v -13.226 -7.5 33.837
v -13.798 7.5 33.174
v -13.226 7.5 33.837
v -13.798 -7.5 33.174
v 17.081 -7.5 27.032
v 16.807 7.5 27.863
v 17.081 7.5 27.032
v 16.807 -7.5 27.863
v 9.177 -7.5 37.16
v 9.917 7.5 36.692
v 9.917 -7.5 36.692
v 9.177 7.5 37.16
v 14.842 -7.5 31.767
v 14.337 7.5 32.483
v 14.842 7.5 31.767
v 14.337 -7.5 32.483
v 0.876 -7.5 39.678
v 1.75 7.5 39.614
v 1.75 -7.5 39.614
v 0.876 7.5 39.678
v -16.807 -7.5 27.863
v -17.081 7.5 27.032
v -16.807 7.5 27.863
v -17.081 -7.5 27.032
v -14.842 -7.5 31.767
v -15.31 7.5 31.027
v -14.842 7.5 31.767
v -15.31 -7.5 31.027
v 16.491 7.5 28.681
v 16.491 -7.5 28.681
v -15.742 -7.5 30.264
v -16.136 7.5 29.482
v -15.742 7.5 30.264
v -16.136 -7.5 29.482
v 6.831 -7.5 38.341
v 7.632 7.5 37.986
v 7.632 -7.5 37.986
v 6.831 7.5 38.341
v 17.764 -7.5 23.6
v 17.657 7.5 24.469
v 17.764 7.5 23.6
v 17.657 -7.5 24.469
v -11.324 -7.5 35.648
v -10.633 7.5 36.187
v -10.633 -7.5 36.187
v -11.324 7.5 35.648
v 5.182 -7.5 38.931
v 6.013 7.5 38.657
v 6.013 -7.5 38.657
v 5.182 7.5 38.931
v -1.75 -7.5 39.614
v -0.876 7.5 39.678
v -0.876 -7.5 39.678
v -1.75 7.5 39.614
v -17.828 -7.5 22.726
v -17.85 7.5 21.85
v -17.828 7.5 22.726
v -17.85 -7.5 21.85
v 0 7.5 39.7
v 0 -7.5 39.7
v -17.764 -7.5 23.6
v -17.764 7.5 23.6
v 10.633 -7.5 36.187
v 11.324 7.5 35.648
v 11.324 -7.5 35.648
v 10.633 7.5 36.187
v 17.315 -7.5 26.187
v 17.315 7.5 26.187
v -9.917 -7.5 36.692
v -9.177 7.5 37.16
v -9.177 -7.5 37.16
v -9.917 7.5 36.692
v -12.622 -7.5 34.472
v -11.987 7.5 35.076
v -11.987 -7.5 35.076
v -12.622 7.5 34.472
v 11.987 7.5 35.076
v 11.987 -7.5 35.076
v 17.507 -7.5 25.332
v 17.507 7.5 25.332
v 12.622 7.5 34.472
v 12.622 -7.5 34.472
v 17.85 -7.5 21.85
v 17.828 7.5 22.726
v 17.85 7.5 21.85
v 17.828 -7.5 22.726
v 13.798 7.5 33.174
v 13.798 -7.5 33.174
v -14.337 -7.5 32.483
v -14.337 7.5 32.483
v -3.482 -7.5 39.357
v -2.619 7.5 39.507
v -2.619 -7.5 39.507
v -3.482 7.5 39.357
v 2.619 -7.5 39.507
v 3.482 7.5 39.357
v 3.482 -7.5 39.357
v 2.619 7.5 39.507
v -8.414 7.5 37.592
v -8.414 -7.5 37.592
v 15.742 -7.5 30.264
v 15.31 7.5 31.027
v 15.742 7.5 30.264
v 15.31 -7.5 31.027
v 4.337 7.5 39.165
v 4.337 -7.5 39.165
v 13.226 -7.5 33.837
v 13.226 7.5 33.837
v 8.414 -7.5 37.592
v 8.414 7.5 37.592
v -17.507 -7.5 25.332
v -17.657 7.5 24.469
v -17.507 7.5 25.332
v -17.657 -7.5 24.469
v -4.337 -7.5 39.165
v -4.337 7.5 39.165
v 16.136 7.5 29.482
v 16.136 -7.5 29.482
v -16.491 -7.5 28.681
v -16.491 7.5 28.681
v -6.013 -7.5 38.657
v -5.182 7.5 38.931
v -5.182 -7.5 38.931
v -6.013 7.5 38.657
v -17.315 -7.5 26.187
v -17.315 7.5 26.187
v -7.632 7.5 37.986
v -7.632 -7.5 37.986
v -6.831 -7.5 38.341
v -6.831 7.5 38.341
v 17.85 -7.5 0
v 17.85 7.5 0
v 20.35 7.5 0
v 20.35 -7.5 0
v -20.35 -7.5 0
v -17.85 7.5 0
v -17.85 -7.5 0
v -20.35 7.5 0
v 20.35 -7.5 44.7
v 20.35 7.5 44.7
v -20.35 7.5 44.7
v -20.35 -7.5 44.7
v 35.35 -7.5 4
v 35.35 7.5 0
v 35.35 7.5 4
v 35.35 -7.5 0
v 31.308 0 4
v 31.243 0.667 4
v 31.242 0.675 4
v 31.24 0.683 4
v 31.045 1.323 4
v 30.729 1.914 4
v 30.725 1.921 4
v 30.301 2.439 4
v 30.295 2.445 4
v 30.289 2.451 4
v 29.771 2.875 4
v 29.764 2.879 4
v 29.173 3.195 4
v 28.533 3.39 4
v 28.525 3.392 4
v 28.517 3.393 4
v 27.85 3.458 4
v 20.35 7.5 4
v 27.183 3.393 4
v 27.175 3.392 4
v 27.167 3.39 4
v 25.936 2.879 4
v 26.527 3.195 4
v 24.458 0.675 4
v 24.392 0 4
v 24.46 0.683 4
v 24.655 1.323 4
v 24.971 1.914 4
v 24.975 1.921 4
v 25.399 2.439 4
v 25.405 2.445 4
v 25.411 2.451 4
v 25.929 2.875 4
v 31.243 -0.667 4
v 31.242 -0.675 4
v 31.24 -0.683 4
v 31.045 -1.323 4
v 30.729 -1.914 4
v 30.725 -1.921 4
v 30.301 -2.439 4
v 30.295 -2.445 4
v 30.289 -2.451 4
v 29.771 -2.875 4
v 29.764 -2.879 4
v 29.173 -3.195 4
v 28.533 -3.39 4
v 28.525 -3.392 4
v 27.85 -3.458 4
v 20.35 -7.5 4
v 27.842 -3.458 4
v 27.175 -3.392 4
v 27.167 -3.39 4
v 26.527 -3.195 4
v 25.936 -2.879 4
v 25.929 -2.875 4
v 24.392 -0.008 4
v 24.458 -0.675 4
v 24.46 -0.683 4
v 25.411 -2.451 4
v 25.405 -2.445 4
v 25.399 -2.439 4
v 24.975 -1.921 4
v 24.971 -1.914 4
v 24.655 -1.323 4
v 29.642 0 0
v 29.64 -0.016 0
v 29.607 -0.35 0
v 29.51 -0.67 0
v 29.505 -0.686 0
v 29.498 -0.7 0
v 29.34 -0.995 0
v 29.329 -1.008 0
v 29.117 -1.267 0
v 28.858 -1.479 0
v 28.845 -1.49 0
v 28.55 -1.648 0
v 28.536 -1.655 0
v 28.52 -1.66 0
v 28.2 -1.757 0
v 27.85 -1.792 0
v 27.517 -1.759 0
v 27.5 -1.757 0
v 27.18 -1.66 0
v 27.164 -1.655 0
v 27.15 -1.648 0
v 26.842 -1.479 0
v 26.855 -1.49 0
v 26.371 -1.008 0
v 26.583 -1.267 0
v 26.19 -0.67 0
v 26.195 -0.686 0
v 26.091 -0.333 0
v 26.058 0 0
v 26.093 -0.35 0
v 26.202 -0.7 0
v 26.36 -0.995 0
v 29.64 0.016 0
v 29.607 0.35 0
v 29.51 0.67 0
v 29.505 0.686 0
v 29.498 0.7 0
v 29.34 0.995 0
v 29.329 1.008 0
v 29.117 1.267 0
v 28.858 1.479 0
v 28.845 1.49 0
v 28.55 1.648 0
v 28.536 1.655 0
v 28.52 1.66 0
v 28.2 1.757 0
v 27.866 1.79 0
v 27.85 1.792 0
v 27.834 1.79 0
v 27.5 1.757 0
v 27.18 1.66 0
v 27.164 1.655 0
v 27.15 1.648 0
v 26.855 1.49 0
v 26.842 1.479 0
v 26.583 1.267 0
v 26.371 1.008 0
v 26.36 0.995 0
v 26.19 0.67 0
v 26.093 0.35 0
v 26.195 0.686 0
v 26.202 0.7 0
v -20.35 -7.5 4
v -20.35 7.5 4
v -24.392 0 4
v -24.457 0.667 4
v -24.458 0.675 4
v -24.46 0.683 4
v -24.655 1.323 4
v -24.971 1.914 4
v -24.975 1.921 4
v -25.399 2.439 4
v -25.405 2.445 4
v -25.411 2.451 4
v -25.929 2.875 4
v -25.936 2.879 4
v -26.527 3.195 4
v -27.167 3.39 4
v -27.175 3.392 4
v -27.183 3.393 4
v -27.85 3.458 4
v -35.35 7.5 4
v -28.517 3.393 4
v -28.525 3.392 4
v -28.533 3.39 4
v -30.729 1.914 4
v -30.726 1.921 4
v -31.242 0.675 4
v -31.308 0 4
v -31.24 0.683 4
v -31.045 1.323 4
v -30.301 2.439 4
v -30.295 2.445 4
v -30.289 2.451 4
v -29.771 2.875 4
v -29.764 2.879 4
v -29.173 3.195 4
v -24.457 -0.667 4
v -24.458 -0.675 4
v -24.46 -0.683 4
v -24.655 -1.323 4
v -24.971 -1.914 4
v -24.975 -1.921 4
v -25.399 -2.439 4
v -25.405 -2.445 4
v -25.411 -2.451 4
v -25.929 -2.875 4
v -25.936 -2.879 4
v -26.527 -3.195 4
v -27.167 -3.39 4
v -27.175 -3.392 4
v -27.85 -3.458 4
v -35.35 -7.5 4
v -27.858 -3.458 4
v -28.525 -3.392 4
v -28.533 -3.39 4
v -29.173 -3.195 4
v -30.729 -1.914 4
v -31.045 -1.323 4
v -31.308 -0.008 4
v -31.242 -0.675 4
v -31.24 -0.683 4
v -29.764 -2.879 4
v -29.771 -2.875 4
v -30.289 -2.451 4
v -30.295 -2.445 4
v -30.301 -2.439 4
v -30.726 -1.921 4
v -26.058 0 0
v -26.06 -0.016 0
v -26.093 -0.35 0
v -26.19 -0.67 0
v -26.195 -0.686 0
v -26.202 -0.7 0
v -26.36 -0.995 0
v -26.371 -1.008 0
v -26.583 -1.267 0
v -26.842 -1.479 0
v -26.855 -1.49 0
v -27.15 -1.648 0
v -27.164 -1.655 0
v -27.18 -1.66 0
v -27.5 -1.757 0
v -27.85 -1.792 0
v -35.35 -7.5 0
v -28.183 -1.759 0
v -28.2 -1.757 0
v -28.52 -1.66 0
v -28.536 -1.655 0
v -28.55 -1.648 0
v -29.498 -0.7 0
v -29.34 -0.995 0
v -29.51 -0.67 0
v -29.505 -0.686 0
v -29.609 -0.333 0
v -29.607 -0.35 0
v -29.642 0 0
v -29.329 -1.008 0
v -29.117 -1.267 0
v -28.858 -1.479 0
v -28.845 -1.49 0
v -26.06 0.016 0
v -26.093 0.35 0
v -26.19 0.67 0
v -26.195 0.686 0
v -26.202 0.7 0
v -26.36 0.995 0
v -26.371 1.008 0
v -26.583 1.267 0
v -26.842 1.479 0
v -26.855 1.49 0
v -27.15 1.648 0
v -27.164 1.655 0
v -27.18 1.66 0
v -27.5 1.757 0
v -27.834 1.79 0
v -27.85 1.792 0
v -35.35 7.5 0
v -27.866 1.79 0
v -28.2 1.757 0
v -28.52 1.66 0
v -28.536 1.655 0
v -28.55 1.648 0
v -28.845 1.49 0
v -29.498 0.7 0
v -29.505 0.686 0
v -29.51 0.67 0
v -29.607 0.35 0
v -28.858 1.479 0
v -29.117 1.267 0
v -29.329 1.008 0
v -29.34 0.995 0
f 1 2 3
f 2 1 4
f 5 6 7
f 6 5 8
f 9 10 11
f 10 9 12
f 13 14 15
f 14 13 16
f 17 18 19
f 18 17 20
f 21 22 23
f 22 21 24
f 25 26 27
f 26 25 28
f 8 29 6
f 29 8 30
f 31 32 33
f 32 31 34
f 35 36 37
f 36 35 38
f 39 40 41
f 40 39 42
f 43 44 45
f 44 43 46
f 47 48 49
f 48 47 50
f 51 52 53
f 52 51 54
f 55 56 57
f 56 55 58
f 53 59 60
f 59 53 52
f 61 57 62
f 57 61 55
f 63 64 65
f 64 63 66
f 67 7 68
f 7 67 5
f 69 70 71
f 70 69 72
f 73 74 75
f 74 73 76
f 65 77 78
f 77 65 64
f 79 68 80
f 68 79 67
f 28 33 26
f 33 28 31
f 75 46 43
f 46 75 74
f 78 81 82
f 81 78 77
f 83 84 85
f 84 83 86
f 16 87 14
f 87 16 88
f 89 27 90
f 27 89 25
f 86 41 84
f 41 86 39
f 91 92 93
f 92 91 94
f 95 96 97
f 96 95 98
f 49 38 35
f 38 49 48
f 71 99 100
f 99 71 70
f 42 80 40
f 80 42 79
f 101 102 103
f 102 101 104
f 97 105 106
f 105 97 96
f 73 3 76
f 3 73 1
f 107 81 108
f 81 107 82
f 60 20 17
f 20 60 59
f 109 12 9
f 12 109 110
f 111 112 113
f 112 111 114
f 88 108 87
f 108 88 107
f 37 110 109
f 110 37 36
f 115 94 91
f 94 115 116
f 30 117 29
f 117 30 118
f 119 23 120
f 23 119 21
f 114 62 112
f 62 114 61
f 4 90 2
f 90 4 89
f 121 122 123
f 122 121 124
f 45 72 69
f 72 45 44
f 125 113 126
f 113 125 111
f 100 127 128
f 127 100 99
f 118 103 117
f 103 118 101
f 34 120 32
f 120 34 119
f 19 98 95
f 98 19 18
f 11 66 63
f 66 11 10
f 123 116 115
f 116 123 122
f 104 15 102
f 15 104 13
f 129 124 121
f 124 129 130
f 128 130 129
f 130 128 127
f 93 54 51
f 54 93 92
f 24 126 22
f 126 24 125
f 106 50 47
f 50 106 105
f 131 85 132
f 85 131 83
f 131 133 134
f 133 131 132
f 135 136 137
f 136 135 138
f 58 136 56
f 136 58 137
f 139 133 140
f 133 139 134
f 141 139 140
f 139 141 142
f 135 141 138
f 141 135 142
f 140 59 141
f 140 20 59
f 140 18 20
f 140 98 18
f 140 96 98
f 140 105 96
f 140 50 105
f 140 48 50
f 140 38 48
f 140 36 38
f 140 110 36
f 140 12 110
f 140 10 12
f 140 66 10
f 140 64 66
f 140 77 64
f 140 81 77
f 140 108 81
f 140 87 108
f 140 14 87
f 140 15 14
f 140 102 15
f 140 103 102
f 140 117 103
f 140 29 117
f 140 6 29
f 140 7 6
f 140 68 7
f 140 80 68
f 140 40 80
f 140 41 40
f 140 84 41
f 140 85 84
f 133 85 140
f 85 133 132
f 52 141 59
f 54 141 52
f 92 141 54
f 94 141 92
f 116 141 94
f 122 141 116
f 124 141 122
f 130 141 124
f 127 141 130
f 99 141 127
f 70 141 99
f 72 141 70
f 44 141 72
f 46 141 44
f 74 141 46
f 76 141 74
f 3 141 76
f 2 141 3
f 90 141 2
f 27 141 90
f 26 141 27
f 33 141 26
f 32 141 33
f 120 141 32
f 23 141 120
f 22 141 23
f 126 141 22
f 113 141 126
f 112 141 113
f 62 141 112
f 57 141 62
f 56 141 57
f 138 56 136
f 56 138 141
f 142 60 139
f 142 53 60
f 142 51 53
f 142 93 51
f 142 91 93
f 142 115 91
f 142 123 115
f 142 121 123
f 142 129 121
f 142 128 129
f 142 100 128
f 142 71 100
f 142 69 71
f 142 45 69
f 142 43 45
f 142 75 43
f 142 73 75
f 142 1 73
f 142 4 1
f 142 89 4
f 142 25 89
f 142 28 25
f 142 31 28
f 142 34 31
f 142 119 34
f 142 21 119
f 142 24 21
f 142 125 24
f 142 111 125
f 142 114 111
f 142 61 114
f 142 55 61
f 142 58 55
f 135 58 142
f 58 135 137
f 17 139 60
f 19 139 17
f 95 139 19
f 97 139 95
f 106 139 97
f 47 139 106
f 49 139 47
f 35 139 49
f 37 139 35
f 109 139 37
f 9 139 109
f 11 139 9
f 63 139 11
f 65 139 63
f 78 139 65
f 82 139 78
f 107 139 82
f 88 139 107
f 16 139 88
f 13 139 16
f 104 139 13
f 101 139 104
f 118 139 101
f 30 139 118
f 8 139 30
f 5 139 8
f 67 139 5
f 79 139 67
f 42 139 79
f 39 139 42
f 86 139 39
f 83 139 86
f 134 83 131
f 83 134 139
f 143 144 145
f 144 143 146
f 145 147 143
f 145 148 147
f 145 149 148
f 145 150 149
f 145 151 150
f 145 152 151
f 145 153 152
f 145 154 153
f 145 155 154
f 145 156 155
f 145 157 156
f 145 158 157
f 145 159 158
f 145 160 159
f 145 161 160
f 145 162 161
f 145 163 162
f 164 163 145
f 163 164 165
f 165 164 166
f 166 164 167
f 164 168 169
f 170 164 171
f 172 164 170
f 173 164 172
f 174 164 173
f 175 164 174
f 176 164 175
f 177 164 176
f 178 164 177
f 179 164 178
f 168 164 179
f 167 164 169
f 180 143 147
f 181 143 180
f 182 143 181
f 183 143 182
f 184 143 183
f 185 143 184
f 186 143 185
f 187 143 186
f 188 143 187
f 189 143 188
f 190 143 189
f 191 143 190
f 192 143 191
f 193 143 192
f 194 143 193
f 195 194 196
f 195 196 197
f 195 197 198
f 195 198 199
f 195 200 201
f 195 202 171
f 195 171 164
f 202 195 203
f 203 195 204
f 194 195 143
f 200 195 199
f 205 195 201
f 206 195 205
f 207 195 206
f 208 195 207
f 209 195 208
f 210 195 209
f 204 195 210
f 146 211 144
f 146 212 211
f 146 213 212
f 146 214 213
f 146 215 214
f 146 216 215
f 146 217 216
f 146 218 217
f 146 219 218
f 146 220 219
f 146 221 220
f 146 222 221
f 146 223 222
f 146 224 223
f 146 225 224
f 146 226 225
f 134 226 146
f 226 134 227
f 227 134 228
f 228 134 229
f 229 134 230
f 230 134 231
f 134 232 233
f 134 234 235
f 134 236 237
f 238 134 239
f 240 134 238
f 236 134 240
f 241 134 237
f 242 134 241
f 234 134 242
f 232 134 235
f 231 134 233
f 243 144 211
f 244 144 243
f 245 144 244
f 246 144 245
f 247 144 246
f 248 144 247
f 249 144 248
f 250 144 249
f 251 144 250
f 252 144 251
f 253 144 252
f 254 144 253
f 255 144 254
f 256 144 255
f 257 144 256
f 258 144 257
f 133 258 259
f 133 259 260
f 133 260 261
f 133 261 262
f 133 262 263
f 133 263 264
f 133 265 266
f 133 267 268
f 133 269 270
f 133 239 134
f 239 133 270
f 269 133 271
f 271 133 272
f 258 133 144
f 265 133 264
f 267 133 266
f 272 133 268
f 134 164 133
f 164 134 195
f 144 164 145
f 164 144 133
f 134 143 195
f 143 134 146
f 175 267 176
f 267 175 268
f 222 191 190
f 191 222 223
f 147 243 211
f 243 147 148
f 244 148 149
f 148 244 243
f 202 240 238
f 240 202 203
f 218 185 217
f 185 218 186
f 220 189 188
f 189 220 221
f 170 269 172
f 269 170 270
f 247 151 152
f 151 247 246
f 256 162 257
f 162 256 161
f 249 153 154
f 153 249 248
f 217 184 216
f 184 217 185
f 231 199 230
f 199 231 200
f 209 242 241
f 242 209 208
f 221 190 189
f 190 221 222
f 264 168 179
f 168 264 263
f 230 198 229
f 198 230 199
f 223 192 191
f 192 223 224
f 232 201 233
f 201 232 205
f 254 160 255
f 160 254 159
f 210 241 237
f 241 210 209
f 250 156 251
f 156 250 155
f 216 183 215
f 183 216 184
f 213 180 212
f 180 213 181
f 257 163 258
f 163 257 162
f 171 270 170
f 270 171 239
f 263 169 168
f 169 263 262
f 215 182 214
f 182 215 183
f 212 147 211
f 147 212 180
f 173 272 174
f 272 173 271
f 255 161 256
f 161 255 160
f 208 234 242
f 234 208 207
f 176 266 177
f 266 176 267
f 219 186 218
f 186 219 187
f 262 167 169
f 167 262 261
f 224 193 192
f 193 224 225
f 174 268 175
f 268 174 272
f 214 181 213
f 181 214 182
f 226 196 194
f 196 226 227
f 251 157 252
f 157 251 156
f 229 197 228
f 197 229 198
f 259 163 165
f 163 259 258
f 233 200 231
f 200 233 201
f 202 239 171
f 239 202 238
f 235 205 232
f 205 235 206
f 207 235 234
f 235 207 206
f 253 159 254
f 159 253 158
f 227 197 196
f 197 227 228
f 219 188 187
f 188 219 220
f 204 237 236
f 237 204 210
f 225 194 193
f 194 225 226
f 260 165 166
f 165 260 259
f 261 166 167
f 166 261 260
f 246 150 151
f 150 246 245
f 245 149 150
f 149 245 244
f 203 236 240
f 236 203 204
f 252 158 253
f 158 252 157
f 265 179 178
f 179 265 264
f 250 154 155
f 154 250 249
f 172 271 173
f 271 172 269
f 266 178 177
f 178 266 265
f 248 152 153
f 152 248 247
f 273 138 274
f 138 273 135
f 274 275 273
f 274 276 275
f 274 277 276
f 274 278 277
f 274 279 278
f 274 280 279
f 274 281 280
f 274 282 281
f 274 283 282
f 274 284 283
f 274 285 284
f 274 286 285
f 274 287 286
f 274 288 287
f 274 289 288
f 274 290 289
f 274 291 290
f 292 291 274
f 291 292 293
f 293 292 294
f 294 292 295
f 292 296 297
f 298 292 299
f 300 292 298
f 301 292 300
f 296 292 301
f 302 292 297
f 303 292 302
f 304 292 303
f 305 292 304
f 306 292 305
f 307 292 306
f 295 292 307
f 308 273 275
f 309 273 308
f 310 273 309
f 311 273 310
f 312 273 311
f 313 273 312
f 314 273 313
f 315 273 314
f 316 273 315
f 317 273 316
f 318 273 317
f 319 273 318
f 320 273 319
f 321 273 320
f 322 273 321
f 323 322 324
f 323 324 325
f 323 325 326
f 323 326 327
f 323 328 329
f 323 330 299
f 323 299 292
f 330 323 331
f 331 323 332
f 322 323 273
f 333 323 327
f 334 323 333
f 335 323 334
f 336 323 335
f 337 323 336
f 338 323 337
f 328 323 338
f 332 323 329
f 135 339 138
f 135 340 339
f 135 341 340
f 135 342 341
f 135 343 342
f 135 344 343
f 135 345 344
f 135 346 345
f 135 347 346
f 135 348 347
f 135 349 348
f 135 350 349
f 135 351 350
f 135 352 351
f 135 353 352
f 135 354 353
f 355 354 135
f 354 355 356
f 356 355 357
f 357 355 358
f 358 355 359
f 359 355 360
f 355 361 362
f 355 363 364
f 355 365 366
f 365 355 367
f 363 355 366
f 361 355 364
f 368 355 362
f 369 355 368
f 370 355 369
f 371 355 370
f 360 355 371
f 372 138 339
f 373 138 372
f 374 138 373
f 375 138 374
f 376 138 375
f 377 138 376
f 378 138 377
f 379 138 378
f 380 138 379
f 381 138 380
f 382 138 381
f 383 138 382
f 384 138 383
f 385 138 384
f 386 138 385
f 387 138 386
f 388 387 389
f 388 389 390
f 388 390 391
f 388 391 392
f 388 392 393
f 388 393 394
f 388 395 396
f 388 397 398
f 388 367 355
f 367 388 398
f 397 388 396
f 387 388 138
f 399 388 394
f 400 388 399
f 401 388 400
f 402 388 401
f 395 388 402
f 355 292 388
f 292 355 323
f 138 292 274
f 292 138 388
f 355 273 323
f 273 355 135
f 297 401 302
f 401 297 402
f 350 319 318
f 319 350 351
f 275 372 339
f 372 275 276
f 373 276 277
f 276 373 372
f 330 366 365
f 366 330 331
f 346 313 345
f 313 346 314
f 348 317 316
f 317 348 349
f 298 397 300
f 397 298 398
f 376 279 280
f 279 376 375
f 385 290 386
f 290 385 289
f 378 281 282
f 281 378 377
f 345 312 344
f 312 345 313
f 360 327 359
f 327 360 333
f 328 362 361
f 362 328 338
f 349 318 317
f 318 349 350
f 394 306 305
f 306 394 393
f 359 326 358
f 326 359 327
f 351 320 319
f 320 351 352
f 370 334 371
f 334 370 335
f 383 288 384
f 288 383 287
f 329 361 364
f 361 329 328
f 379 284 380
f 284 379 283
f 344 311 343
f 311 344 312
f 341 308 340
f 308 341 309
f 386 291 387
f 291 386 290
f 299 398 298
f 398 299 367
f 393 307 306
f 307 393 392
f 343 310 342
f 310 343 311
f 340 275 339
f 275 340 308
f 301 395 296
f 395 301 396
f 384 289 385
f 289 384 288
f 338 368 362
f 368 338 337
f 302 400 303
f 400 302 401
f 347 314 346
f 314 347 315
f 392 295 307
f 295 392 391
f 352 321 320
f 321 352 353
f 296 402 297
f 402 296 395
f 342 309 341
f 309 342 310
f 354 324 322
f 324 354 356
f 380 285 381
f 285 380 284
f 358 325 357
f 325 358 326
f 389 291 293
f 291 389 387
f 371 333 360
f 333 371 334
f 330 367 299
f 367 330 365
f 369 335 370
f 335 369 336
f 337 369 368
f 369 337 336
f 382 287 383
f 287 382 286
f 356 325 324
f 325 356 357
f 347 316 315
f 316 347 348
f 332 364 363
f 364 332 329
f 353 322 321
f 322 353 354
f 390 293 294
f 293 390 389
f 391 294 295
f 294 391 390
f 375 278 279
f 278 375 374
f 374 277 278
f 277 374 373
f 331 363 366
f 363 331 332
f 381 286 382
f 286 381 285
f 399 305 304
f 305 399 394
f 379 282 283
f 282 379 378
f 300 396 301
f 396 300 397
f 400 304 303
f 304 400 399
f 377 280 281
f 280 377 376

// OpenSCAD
org_mot_od=35;
mot_od=org_mot_od+0.7;
br_wd=15;
br_th=5;
br_h=mot_od/2+br_th;
br_sp=mot_od+br_th;
br_lth=4;
cl_h=mot_od+br_th;
$fn=128;


clamp_and_flap();

module clamp_and_flap(){
    clamp();
    translate([br_sp/2,-br_wd/2,0]) flapr();
    translate([-br_sp/2,-br_wd/2,0]) flapl();
}

module clamp(){    
    cl_xtra=4;
    translate([0,0,mot_od/2]){
        difference(){
            translate([0,0,br_th/2+cl_xtra/2]) 
                cube([br_sp,br_wd,cl_h+cl_xtra],center=true);
            union(){
                translate([0,-br_wd/2-0.5,+cl_xtra]) rotate([-90,0,0]) cylinder(d=mot_od,h=br_wd+1);
                translate([0,-0.1,-mot_od/4+cl_xtra/2]) cube([mot_od,br_wd+1,mot_od/2+cl_xtra],center=true);
            }
        }
    }
  
}

module bracket_and_flap(){
    bracket();
    translate([br_sp/2,0,0]) flapr();
    translate([-br_sp/2,0,0]) flapl();

};

module flapr(){
     flscrd=3.5;
    difference(){
        cube([15,br_wd,br_lth]);
        translate([15/2,br_wd/2,-0.1]) cylinder(r1=flscrd/2,r2=flscrd/2*2,h=br_lth+0.2,$fn=32);
    }
}
module flapl(){
    flscrd=3.5;
    translate([-15,0,0]){
        
        difference(){
            cube([15,br_wd,br_lth]);
            translate([15/2,br_wd/2,-0.1]) cylinder(r1=flscrd/2,r2=flscrd/2*2,h=br_lth+0.2,$fn=32);
        }
    }
}

module bracket(){
    difference(){
        translate([-br_sp/2,0,0]) cube([br_sp,br_wd,br_h]);
        translate([0,-0.5,br_h]) rotate([-90,0,0]) cylinder(d=mot_od,h=br_wd+1);
    };

}
